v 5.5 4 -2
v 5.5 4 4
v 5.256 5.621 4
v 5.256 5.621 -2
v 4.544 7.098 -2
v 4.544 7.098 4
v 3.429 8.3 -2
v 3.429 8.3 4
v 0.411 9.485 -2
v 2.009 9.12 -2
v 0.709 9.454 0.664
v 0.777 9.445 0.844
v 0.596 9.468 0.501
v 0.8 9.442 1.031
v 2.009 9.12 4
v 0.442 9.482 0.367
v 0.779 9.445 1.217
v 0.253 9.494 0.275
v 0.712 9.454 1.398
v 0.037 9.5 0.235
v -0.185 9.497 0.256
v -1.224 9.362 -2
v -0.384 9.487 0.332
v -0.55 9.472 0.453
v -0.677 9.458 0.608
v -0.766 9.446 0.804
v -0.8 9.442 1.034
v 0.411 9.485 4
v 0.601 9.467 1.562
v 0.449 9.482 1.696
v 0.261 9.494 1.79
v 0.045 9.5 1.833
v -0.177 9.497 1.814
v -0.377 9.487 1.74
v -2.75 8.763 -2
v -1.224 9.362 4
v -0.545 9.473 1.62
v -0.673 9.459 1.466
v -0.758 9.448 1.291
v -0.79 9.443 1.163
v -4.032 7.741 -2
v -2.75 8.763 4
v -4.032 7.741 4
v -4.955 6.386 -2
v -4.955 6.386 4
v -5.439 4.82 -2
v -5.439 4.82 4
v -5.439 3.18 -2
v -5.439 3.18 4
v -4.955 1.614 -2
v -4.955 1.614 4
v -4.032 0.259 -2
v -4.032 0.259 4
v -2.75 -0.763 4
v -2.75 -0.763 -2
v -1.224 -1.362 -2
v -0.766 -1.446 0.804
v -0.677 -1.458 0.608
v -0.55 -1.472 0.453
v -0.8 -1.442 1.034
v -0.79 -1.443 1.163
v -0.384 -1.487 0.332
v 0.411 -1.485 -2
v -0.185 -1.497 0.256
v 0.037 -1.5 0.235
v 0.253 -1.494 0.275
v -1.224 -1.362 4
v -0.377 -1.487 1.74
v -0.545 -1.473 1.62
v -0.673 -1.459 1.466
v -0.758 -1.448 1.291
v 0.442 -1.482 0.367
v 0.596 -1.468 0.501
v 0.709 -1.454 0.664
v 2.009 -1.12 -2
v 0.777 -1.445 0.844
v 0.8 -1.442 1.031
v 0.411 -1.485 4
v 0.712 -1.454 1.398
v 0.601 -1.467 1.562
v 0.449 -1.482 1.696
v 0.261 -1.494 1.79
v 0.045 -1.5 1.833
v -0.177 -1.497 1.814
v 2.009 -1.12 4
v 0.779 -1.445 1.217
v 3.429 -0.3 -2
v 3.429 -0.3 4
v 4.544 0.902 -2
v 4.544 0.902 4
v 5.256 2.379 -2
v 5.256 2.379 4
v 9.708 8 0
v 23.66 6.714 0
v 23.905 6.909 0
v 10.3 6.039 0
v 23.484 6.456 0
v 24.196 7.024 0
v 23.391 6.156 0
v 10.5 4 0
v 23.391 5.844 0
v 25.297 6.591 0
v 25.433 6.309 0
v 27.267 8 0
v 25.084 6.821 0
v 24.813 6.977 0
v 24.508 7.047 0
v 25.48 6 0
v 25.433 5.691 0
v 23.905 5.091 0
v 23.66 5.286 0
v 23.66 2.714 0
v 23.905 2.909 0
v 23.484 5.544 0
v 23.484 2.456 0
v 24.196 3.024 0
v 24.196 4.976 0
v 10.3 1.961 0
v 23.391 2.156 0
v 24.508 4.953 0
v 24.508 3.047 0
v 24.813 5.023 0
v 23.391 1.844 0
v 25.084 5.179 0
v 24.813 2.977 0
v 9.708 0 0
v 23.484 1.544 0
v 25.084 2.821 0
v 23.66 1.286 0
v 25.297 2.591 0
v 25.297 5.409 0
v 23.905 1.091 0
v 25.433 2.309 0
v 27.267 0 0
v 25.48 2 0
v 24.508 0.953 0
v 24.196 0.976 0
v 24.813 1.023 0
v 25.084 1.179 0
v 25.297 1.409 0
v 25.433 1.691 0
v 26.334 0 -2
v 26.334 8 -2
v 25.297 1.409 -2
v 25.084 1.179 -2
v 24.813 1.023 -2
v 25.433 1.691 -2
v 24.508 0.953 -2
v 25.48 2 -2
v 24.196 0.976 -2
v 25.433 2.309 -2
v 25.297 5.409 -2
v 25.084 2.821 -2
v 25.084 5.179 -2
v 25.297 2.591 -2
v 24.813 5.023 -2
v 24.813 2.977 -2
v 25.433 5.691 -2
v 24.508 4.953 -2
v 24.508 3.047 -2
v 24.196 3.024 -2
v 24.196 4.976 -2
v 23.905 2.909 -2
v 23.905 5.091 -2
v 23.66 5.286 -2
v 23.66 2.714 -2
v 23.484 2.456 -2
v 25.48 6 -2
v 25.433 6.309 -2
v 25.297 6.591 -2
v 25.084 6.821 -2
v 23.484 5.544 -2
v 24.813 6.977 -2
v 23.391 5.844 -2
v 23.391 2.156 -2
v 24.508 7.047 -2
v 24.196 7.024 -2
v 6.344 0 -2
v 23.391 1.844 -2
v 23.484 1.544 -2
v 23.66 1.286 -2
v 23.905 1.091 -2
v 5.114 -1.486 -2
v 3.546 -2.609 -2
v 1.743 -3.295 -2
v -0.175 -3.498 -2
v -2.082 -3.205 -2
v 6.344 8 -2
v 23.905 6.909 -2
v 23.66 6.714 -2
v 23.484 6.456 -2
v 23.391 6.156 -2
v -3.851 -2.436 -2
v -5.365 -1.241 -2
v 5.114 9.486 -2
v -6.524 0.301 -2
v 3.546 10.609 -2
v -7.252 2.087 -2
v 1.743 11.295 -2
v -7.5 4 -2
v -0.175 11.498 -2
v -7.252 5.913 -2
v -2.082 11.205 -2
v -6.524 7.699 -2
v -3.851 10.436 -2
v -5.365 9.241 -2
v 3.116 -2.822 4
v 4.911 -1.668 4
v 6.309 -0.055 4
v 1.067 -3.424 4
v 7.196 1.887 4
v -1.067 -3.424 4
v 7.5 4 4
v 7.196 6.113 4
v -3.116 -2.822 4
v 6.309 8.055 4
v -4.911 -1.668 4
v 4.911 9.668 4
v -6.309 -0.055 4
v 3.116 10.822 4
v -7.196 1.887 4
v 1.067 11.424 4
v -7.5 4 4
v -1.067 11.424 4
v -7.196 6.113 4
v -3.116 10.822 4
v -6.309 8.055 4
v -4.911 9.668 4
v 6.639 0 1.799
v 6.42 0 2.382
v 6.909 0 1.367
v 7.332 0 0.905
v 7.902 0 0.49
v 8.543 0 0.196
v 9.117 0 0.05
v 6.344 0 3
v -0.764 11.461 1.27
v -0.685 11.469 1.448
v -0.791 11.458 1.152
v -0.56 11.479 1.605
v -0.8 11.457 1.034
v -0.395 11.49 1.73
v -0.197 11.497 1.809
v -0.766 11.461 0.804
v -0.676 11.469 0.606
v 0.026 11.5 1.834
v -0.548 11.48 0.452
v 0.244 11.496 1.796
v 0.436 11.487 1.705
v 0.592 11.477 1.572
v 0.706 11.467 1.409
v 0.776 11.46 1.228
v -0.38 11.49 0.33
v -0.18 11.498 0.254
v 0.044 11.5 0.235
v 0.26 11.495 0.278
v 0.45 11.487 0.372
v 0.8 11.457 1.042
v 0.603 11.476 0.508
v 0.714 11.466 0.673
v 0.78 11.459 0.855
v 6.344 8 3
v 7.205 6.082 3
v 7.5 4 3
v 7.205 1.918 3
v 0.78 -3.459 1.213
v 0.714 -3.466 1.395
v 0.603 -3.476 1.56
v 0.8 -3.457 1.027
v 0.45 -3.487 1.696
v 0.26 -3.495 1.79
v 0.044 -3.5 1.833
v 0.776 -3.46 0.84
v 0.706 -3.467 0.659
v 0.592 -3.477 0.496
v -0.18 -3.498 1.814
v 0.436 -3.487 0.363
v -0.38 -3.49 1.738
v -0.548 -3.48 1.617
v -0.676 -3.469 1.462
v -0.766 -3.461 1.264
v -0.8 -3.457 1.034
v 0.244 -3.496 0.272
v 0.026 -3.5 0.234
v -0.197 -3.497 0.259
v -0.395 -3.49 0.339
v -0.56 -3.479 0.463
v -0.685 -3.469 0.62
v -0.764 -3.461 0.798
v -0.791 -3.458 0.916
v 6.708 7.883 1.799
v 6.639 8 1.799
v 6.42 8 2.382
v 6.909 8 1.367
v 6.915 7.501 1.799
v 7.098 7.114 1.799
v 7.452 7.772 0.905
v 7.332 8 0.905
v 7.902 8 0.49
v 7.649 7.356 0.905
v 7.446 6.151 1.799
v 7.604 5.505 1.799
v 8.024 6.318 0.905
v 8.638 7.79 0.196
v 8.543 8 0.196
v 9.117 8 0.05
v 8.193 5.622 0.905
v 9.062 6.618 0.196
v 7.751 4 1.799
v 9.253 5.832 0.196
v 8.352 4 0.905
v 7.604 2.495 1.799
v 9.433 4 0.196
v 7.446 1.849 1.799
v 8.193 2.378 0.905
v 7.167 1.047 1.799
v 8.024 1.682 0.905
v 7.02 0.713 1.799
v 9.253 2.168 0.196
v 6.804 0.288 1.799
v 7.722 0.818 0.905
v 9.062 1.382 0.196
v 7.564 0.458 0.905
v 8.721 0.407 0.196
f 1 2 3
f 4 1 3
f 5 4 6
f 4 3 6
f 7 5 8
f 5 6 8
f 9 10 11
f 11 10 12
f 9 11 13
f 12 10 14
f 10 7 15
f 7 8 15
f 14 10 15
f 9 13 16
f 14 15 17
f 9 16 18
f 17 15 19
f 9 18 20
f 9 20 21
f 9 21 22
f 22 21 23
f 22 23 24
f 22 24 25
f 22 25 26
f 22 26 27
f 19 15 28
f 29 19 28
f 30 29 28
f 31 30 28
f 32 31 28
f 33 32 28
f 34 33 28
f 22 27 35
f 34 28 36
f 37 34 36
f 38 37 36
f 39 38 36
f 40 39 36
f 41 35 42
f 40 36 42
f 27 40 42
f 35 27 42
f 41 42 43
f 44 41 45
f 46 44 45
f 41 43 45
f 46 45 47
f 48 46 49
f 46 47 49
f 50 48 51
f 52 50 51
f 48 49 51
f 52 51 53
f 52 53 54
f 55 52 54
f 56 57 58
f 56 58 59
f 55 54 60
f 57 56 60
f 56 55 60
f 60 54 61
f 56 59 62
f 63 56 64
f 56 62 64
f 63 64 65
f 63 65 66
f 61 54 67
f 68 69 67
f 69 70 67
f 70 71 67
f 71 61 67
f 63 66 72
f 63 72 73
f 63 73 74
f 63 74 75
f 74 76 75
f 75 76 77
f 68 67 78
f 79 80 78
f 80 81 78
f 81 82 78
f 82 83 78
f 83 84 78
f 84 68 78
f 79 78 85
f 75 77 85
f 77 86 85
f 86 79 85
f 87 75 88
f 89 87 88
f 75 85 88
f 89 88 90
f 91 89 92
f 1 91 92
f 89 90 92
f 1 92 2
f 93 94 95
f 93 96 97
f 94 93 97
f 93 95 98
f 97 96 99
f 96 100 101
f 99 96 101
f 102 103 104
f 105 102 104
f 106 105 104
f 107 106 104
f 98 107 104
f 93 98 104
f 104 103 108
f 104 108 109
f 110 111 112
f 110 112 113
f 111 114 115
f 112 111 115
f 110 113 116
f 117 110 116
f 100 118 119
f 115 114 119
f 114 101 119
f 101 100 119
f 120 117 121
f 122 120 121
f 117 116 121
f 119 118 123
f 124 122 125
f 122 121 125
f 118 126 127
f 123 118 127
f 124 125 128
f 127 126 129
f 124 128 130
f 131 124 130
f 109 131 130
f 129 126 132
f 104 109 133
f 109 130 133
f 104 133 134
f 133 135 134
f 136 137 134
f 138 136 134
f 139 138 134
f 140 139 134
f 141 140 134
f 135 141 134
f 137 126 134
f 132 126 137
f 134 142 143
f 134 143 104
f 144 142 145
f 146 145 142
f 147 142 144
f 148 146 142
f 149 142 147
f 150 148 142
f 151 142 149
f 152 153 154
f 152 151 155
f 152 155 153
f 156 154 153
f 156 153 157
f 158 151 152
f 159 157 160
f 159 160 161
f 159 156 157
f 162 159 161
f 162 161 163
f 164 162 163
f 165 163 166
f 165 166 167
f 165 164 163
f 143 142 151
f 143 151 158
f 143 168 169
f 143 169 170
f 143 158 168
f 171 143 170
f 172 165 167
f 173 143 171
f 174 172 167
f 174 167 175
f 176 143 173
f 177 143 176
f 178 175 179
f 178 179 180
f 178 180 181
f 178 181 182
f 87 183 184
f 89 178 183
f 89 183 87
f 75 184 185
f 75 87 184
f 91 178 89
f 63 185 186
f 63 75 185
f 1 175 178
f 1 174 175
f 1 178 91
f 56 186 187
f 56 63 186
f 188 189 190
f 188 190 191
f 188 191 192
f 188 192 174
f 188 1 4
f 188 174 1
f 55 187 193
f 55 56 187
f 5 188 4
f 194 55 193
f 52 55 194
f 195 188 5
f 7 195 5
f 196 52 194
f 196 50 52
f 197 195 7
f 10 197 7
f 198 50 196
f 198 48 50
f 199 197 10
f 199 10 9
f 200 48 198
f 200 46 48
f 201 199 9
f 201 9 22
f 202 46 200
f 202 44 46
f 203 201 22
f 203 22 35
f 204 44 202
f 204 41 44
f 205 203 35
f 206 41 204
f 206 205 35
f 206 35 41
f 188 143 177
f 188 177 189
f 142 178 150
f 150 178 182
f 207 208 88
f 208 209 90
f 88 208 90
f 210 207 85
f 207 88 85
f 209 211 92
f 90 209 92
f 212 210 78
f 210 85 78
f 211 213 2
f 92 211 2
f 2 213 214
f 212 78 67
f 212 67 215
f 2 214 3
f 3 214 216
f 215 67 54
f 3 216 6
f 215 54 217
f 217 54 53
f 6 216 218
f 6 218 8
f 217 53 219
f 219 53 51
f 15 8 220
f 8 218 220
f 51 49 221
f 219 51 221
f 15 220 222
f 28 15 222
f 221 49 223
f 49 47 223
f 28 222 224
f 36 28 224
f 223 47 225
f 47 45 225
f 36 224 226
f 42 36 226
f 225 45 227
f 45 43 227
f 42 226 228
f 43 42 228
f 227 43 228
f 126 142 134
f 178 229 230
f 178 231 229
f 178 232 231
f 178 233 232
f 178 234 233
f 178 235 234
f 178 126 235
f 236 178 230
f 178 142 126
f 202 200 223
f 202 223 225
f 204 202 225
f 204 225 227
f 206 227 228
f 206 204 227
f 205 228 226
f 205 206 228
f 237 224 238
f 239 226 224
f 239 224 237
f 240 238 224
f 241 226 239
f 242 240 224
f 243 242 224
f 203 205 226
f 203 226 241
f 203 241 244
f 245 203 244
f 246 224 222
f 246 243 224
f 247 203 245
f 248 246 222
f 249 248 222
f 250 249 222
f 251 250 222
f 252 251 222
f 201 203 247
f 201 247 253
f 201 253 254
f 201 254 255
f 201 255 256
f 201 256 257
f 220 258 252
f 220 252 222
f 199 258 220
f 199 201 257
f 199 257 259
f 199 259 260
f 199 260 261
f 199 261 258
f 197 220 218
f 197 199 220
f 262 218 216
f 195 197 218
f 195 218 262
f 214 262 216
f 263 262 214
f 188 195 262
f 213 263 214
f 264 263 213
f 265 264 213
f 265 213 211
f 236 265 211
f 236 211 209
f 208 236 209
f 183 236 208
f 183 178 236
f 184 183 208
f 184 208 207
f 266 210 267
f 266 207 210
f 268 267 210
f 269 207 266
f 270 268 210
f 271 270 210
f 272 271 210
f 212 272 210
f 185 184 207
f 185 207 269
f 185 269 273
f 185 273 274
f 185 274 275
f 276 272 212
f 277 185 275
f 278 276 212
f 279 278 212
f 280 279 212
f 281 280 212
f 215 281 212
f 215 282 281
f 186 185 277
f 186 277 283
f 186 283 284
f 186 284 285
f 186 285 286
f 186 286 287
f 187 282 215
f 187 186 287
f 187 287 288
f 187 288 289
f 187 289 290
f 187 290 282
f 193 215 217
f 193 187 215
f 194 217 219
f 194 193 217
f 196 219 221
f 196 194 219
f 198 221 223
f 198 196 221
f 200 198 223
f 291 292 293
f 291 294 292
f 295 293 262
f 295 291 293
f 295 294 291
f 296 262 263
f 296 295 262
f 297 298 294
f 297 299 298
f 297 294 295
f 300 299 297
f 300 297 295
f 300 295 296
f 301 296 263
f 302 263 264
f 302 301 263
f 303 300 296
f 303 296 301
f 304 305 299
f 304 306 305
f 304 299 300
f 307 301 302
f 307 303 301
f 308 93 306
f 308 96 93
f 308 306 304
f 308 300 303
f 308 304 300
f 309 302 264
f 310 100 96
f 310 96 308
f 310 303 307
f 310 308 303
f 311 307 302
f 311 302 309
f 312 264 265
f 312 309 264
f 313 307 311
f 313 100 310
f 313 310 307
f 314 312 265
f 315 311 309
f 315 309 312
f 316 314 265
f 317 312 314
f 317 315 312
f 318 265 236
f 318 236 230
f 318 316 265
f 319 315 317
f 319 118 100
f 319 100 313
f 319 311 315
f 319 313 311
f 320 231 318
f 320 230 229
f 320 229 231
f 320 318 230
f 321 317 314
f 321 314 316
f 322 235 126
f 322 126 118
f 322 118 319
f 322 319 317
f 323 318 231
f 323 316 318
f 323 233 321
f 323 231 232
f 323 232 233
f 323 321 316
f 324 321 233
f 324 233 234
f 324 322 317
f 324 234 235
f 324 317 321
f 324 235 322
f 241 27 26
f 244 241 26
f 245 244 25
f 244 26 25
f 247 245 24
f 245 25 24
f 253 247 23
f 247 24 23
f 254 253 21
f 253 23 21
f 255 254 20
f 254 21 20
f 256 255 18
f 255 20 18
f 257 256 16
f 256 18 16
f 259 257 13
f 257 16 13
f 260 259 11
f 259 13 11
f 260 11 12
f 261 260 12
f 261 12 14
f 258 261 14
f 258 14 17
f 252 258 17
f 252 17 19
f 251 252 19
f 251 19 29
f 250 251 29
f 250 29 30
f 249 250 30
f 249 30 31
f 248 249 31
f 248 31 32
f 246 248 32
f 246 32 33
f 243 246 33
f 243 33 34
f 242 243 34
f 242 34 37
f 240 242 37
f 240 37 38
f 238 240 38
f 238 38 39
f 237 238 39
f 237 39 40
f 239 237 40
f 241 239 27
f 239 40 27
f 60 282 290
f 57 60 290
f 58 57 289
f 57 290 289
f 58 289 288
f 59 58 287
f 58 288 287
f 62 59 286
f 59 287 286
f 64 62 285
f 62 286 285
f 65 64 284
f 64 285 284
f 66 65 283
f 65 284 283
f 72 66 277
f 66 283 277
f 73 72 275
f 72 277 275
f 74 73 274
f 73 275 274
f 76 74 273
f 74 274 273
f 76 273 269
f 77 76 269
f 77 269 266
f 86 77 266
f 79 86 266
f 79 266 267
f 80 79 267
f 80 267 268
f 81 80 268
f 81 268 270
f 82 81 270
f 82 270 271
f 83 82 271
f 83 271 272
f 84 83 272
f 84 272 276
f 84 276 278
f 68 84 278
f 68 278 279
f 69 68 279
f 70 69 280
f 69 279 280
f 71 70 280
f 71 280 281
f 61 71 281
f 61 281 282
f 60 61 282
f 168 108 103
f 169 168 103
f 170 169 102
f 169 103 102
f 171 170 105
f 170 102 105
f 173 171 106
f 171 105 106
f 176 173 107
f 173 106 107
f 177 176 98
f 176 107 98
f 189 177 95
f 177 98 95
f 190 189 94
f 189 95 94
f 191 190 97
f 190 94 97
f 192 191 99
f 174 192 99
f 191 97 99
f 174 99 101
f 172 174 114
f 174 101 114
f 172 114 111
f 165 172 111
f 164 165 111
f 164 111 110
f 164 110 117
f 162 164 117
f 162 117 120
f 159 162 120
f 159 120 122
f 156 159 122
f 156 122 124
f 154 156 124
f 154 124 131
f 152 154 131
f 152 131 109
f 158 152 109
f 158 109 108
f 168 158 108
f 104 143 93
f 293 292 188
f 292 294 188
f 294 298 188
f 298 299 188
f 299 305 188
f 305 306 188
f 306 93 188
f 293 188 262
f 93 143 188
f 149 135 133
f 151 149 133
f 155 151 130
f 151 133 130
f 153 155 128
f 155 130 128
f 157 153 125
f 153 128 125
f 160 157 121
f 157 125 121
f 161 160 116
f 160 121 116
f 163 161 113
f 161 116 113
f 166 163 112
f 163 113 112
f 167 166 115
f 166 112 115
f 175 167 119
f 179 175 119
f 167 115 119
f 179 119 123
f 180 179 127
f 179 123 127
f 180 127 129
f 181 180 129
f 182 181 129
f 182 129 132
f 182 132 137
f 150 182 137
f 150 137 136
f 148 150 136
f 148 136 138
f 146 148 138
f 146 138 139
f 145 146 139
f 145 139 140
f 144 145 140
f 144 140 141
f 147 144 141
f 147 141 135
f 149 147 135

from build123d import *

# Parameters (mm, degrees)
BOSS_EXTRUDE1_DEPTH     = 8
SKETCH6_R               = 7.5
BOSS_EXTRUDE3_DEPTH     = 6
SKETCH2_R               = 5.5
CUT_EXTRUDE4_DEPTH      = 5
CUT_EXTRUDE4_DEPTH_BACK = 3
SKETCH8_R               = 0.8
CUT_EXTRUDE5_DEPTH      = 16
FILLET3_R               = 3
SKETCH9_R               = 1.05
CUT_EXTRUDE6_DEPTH      = 3.0000001


with BuildPart() as part:
    # Sketch1 → Boss-Extrude1 (new body)
    with BuildSketch(Plane(origin=(0, 0, 0), x_dir=(1, 0, 0), z_dir=(0, 1, 0))):
        Polygon((0, 0), (0, 2), (26.334414729, 2), (27.267030045, 0), (21.996962058, 0), align=None)
    extrude(amount=BOSS_EXTRUDE1_DEPTH)

    # Sketch6 → Boss-Extrude3 (add)
    with BuildSketch(Plane(origin=(0, 0, -2), x_dir=(-1, 0, 0), z_dir=(0, 0, -1))):
        with Locations((0, 4)):
            Circle(SKETCH6_R)
    extrude(amount=-BOSS_EXTRUDE3_DEPTH)

    # Sketch2 → Cut-Extrude4 (cut, two sides)
    with BuildSketch(Plane.XY) as cut_extrude4_sk:
        with Locations((0, 4)):
            Circle(SKETCH2_R)
    extrude(amount=CUT_EXTRUDE4_DEPTH, mode=Mode.SUBTRACT)
    extrude(cut_extrude4_sk.sketch, amount=-CUT_EXTRUDE4_DEPTH_BACK, mode=Mode.SUBTRACT)

    # Sketch8 → Cut-Extrude5 (cut, through all)
    with BuildSketch(Plane(origin=(0, -3.5, 0), x_dir=(-1, 0, 0), z_dir=(0, -1, 0))):
        with Locations((0, -1.034043254)):
            Circle(SKETCH8_R)
    extrude(amount=-CUT_EXTRUDE5_DEPTH, mode=Mode.SUBTRACT)

    # Fillet3
    fillet3_edges = [part.edges().sort_by_distance(p)[0] for p in [
        (7.5, 4, 0),
    ]]
    fillet(fillet3_edges, radius=FILLET3_R)

    # Sketch9 → Cut-Extrude6 (cut, through all)
    with BuildSketch(Plane.XY):
        with Locations((24.429577374, 2)):
            Circle(SKETCH9_R)
        with Locations((24.429577374, 6)):
            Circle(SKETCH9_R)
    extrude(amount=-CUT_EXTRUDE6_DEPTH, mode=Mode.SUBTRACT)


solid = part.part
